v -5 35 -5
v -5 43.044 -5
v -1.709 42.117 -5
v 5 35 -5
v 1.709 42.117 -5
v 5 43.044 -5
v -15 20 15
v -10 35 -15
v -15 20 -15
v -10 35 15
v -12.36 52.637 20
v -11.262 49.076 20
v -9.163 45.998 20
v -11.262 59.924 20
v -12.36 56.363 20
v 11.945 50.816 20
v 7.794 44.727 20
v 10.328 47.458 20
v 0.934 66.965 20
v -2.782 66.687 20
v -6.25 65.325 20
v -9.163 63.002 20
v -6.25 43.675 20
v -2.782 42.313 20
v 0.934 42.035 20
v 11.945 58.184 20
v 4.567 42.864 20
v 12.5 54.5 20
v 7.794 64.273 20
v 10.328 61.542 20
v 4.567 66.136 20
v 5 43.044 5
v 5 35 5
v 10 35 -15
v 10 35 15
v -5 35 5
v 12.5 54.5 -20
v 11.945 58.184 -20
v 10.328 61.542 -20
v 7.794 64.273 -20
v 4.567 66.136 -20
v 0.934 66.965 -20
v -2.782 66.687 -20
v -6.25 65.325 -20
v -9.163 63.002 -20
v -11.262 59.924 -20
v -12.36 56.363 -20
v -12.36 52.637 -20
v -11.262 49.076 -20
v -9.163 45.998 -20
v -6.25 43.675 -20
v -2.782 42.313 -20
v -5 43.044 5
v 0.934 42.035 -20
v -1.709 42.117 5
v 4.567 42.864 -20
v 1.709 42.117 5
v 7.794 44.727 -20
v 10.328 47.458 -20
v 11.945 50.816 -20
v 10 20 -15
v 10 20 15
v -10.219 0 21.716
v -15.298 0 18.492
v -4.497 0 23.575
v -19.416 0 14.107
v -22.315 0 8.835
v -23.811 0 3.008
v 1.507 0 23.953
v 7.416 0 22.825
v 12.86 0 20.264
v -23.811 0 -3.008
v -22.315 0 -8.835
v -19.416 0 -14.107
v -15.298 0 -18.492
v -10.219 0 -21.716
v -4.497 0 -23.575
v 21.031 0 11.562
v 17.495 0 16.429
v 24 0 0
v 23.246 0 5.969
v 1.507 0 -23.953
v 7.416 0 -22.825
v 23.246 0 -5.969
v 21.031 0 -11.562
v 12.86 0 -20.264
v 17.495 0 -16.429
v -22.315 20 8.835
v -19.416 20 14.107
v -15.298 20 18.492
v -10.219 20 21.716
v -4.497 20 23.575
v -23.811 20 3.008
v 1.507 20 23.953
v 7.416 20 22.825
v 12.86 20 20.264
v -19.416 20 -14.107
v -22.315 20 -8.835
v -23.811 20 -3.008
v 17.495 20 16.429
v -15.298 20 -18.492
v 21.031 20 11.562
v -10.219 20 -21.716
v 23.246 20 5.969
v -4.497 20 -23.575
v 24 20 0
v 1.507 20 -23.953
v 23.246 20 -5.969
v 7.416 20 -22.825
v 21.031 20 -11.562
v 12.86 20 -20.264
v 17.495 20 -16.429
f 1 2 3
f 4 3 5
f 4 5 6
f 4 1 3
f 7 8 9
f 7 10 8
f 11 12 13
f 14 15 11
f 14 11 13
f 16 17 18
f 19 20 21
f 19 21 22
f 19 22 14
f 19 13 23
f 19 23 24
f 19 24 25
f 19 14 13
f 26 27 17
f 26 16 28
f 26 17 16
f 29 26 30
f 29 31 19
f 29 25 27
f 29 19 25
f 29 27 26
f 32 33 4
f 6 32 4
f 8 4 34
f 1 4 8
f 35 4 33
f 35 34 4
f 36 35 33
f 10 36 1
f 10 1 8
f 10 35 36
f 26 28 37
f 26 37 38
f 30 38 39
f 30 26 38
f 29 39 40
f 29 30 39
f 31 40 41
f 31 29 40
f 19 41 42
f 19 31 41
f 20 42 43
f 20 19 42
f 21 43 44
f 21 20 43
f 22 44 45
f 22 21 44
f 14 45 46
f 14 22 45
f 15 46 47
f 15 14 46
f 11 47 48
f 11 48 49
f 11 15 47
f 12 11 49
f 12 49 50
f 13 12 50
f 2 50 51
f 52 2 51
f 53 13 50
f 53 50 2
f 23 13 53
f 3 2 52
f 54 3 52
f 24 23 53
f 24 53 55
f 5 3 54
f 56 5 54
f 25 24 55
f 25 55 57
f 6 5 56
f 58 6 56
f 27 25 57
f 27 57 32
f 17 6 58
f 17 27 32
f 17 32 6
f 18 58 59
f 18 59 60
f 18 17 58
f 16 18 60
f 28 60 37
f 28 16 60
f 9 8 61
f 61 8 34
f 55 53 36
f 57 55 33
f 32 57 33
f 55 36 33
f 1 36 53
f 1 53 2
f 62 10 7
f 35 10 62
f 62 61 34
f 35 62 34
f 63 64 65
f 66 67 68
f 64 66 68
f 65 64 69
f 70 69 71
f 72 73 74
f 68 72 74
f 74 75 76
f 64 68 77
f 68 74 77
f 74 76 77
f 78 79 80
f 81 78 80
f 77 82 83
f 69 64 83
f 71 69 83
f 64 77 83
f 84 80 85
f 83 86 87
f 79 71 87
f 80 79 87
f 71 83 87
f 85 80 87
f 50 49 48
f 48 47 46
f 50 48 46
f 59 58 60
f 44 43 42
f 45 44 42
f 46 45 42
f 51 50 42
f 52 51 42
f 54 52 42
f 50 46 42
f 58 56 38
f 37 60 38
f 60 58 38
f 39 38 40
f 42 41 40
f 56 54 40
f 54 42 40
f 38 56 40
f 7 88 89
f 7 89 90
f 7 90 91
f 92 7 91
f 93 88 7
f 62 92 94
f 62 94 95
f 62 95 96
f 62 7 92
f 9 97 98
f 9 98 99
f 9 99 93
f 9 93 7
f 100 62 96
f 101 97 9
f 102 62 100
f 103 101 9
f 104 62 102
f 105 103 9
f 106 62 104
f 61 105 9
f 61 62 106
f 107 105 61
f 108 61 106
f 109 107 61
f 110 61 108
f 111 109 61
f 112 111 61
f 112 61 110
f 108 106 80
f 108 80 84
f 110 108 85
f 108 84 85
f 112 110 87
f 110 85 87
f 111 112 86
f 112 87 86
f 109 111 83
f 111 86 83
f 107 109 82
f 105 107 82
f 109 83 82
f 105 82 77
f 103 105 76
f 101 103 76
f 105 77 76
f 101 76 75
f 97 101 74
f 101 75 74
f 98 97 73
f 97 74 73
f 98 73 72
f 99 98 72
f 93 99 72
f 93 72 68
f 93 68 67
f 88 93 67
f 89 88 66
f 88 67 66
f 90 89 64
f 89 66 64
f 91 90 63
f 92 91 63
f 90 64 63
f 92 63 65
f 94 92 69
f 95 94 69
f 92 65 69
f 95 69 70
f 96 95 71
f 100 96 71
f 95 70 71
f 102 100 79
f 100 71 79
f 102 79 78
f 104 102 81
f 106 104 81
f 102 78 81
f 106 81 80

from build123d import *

# Parameters (mm, degrees)
SKETCH1_R           = 24
BOSS_EXTRUDE1_DEPTH = 20
SKETCH4_R           = 12.5
BOSS_EXTRUDE3_DEPTH = 20
BOSS_EXTRUDE5_DEPTH = 15
SKETCH6_W           = 10
SKETCH6_H           = 10
BOSS_EXTRUDE6_DEPTH = 8.043561


with BuildPart() as part:
    # Sketch1 → Boss-Extrude1 (new body)
    with BuildSketch(Plane(origin=(0, 0, 0), x_dir=(1, 0, 0), z_dir=(0, 1, 0))):
        Circle(SKETCH1_R)
    extrude(amount=BOSS_EXTRUDE1_DEPTH)

    # Sketch5 → Boss-Extrude5 (add, symmetric)
    with BuildSketch(Plane.XY):
        Polygon((-15, 20), (10, 20), (10, 35), (-10, 35), align=None)
    extrude(amount=BOSS_EXTRUDE5_DEPTH, both=True)



with BuildPart() as body_2:
    # Sketch4 → Boss-Extrude3 (new body, symmetric)
    with BuildSketch(Plane.XY):
        with Locations((0, 54.5)):
            Circle(SKETCH4_R)
    extrude(amount=BOSS_EXTRUDE3_DEPTH, both=True)


with BuildPart() as part_1:
    add(part.part)

    add(body_2.part)  # Boss-Extrude6 merges body 2
    # Sketch6 → Boss-Extrude6 (add)
    with BuildSketch(Plane(origin=(0, 35, 0), x_dir=(1, 0, 0), z_dir=(0, 1, 0))):
        Rectangle(SKETCH6_W, SKETCH6_H)
    extrude(amount=BOSS_EXTRUDE6_DEPTH)


solid = part_1.part
